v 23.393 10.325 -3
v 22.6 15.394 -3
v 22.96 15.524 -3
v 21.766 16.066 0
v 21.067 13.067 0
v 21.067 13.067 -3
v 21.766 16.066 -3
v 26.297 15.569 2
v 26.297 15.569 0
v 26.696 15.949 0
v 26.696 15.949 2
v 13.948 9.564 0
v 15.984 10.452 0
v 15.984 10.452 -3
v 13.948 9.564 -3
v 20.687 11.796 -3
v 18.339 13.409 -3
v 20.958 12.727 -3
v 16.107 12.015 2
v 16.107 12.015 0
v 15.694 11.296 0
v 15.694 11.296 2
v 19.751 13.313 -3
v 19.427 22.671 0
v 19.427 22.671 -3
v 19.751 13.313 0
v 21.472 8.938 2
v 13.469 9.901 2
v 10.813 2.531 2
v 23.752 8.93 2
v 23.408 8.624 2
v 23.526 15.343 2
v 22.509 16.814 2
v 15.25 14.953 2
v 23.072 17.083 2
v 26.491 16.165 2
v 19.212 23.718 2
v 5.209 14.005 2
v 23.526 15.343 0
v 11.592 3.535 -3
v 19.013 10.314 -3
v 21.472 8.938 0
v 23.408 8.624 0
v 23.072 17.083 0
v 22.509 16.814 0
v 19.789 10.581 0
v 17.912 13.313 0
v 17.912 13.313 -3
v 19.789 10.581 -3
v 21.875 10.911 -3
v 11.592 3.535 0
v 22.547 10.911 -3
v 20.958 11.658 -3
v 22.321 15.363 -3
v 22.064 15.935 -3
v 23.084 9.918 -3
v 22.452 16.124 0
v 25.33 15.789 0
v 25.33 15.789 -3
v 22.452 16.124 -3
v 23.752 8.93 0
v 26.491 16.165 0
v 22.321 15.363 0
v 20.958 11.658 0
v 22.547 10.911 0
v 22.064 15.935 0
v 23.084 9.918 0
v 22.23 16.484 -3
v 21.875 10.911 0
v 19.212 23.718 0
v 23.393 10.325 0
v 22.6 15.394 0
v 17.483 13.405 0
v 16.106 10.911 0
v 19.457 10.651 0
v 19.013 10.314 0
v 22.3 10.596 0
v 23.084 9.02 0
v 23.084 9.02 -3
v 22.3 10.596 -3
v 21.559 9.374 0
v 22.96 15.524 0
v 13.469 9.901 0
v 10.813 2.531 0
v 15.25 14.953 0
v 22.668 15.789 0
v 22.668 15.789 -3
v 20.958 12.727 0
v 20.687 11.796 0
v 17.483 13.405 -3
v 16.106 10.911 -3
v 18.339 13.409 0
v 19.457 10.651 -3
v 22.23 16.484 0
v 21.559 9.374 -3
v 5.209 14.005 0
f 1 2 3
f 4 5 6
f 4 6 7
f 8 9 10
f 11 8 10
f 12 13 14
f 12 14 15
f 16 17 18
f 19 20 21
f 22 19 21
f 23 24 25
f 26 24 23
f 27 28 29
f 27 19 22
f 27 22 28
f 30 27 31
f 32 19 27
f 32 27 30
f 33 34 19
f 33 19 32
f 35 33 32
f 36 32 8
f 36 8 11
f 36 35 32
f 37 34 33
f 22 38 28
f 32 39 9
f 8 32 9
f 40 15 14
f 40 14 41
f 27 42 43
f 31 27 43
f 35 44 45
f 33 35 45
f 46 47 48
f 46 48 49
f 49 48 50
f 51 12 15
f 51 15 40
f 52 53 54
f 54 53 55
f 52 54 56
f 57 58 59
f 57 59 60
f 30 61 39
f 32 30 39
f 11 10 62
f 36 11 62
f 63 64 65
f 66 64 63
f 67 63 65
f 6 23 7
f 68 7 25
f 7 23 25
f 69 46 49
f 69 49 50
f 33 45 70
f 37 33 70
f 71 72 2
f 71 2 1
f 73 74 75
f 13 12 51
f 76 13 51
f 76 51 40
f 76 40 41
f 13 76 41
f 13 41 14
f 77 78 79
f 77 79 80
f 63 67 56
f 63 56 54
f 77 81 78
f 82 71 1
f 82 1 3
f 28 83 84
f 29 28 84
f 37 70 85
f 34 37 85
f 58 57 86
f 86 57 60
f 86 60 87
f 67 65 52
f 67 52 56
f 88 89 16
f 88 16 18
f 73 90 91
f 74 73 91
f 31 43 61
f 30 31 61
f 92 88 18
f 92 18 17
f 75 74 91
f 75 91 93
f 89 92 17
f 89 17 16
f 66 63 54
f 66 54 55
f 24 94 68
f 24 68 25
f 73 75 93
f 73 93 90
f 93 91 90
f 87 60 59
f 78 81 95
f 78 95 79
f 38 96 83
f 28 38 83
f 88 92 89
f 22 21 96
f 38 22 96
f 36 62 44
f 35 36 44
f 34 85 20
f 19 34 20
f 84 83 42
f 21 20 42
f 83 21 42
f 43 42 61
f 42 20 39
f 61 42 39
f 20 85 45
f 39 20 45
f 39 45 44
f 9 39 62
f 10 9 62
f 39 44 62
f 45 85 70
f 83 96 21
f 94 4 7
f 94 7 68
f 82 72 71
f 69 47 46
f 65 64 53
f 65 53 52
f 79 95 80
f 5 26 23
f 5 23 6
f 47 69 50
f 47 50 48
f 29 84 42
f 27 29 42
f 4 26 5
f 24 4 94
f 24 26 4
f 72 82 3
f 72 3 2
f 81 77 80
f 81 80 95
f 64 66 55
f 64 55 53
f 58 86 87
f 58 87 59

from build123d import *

# Parameters (mm, degrees)
F2_DEPTH = 2
F3_DEPTH = 3


with BuildPart() as f2:
    # F0 (on Top) → F2 (new body)
    with BuildSketch(Plane.XY):
        Polygon((15.693674, 11.295591), (5.209367, 14.004556), (13.469442, 9.900995), (10.812592, 2.530966), (21.472458, 8.937621), (23.408197, 8.623923), (23.752499, 8.929969), (23.526106, 15.342899), (26.296646, 15.569002), (26.696471, 15.948839), (26.490884, 16.165245), (23.071945, 17.083345), (22.508994, 16.814468), (19.211899, 23.717651), (15.249907, 14.952841), (16.106835, 12.0148), align=None)
    extrude(amount=F2_DEPTH)


with BuildPart() as f3:
    # F1 (on face) → F3 (new body)
    with BuildSketch(Plane.XY):
        Polygon((13.948319, 9.564273), (11.591765, 3.535167), (19.013379, 10.314086), (15.983524, 10.451806), align=None)
        Polygon((17.483149, 13.40515), (16.105942, 10.910875), (19.457147, 10.650736), align=None)
        Polygon((21.874908, 10.910875), (17.911613, 13.313336), (19.789428, 10.580754), align=None)
        Polygon((21.559156, 9.373549), (23.083974, 9.019689), (22.2999, 10.59554), align=None)
        Polygon((20.687412, 11.796467), (20.957921, 12.727018), (18.339394, 13.408701), align=None)
        Polygon((22.546863, 10.910875), (23.083974, 9.917685), (22.32087, 15.362685), (22.063516, 15.935294), (20.957921, 11.657914), align=None)
        Polygon((19.750793, 13.313336), (21.06679, 13.066676), (21.7658, 16.065573), (22.229839, 16.484117), (19.427409, 22.671303), align=None)
        Polygon((23.39289, 10.324518), (22.959502, 15.524439), (22.599898, 15.394369), align=None)
        Polygon((25.330141, 15.788756), (22.451926, 16.124187), (22.668332, 15.788756), align=None)
    extrude(amount=-F3_DEPTH)


solid = Compound([f2.part, f3.part])
